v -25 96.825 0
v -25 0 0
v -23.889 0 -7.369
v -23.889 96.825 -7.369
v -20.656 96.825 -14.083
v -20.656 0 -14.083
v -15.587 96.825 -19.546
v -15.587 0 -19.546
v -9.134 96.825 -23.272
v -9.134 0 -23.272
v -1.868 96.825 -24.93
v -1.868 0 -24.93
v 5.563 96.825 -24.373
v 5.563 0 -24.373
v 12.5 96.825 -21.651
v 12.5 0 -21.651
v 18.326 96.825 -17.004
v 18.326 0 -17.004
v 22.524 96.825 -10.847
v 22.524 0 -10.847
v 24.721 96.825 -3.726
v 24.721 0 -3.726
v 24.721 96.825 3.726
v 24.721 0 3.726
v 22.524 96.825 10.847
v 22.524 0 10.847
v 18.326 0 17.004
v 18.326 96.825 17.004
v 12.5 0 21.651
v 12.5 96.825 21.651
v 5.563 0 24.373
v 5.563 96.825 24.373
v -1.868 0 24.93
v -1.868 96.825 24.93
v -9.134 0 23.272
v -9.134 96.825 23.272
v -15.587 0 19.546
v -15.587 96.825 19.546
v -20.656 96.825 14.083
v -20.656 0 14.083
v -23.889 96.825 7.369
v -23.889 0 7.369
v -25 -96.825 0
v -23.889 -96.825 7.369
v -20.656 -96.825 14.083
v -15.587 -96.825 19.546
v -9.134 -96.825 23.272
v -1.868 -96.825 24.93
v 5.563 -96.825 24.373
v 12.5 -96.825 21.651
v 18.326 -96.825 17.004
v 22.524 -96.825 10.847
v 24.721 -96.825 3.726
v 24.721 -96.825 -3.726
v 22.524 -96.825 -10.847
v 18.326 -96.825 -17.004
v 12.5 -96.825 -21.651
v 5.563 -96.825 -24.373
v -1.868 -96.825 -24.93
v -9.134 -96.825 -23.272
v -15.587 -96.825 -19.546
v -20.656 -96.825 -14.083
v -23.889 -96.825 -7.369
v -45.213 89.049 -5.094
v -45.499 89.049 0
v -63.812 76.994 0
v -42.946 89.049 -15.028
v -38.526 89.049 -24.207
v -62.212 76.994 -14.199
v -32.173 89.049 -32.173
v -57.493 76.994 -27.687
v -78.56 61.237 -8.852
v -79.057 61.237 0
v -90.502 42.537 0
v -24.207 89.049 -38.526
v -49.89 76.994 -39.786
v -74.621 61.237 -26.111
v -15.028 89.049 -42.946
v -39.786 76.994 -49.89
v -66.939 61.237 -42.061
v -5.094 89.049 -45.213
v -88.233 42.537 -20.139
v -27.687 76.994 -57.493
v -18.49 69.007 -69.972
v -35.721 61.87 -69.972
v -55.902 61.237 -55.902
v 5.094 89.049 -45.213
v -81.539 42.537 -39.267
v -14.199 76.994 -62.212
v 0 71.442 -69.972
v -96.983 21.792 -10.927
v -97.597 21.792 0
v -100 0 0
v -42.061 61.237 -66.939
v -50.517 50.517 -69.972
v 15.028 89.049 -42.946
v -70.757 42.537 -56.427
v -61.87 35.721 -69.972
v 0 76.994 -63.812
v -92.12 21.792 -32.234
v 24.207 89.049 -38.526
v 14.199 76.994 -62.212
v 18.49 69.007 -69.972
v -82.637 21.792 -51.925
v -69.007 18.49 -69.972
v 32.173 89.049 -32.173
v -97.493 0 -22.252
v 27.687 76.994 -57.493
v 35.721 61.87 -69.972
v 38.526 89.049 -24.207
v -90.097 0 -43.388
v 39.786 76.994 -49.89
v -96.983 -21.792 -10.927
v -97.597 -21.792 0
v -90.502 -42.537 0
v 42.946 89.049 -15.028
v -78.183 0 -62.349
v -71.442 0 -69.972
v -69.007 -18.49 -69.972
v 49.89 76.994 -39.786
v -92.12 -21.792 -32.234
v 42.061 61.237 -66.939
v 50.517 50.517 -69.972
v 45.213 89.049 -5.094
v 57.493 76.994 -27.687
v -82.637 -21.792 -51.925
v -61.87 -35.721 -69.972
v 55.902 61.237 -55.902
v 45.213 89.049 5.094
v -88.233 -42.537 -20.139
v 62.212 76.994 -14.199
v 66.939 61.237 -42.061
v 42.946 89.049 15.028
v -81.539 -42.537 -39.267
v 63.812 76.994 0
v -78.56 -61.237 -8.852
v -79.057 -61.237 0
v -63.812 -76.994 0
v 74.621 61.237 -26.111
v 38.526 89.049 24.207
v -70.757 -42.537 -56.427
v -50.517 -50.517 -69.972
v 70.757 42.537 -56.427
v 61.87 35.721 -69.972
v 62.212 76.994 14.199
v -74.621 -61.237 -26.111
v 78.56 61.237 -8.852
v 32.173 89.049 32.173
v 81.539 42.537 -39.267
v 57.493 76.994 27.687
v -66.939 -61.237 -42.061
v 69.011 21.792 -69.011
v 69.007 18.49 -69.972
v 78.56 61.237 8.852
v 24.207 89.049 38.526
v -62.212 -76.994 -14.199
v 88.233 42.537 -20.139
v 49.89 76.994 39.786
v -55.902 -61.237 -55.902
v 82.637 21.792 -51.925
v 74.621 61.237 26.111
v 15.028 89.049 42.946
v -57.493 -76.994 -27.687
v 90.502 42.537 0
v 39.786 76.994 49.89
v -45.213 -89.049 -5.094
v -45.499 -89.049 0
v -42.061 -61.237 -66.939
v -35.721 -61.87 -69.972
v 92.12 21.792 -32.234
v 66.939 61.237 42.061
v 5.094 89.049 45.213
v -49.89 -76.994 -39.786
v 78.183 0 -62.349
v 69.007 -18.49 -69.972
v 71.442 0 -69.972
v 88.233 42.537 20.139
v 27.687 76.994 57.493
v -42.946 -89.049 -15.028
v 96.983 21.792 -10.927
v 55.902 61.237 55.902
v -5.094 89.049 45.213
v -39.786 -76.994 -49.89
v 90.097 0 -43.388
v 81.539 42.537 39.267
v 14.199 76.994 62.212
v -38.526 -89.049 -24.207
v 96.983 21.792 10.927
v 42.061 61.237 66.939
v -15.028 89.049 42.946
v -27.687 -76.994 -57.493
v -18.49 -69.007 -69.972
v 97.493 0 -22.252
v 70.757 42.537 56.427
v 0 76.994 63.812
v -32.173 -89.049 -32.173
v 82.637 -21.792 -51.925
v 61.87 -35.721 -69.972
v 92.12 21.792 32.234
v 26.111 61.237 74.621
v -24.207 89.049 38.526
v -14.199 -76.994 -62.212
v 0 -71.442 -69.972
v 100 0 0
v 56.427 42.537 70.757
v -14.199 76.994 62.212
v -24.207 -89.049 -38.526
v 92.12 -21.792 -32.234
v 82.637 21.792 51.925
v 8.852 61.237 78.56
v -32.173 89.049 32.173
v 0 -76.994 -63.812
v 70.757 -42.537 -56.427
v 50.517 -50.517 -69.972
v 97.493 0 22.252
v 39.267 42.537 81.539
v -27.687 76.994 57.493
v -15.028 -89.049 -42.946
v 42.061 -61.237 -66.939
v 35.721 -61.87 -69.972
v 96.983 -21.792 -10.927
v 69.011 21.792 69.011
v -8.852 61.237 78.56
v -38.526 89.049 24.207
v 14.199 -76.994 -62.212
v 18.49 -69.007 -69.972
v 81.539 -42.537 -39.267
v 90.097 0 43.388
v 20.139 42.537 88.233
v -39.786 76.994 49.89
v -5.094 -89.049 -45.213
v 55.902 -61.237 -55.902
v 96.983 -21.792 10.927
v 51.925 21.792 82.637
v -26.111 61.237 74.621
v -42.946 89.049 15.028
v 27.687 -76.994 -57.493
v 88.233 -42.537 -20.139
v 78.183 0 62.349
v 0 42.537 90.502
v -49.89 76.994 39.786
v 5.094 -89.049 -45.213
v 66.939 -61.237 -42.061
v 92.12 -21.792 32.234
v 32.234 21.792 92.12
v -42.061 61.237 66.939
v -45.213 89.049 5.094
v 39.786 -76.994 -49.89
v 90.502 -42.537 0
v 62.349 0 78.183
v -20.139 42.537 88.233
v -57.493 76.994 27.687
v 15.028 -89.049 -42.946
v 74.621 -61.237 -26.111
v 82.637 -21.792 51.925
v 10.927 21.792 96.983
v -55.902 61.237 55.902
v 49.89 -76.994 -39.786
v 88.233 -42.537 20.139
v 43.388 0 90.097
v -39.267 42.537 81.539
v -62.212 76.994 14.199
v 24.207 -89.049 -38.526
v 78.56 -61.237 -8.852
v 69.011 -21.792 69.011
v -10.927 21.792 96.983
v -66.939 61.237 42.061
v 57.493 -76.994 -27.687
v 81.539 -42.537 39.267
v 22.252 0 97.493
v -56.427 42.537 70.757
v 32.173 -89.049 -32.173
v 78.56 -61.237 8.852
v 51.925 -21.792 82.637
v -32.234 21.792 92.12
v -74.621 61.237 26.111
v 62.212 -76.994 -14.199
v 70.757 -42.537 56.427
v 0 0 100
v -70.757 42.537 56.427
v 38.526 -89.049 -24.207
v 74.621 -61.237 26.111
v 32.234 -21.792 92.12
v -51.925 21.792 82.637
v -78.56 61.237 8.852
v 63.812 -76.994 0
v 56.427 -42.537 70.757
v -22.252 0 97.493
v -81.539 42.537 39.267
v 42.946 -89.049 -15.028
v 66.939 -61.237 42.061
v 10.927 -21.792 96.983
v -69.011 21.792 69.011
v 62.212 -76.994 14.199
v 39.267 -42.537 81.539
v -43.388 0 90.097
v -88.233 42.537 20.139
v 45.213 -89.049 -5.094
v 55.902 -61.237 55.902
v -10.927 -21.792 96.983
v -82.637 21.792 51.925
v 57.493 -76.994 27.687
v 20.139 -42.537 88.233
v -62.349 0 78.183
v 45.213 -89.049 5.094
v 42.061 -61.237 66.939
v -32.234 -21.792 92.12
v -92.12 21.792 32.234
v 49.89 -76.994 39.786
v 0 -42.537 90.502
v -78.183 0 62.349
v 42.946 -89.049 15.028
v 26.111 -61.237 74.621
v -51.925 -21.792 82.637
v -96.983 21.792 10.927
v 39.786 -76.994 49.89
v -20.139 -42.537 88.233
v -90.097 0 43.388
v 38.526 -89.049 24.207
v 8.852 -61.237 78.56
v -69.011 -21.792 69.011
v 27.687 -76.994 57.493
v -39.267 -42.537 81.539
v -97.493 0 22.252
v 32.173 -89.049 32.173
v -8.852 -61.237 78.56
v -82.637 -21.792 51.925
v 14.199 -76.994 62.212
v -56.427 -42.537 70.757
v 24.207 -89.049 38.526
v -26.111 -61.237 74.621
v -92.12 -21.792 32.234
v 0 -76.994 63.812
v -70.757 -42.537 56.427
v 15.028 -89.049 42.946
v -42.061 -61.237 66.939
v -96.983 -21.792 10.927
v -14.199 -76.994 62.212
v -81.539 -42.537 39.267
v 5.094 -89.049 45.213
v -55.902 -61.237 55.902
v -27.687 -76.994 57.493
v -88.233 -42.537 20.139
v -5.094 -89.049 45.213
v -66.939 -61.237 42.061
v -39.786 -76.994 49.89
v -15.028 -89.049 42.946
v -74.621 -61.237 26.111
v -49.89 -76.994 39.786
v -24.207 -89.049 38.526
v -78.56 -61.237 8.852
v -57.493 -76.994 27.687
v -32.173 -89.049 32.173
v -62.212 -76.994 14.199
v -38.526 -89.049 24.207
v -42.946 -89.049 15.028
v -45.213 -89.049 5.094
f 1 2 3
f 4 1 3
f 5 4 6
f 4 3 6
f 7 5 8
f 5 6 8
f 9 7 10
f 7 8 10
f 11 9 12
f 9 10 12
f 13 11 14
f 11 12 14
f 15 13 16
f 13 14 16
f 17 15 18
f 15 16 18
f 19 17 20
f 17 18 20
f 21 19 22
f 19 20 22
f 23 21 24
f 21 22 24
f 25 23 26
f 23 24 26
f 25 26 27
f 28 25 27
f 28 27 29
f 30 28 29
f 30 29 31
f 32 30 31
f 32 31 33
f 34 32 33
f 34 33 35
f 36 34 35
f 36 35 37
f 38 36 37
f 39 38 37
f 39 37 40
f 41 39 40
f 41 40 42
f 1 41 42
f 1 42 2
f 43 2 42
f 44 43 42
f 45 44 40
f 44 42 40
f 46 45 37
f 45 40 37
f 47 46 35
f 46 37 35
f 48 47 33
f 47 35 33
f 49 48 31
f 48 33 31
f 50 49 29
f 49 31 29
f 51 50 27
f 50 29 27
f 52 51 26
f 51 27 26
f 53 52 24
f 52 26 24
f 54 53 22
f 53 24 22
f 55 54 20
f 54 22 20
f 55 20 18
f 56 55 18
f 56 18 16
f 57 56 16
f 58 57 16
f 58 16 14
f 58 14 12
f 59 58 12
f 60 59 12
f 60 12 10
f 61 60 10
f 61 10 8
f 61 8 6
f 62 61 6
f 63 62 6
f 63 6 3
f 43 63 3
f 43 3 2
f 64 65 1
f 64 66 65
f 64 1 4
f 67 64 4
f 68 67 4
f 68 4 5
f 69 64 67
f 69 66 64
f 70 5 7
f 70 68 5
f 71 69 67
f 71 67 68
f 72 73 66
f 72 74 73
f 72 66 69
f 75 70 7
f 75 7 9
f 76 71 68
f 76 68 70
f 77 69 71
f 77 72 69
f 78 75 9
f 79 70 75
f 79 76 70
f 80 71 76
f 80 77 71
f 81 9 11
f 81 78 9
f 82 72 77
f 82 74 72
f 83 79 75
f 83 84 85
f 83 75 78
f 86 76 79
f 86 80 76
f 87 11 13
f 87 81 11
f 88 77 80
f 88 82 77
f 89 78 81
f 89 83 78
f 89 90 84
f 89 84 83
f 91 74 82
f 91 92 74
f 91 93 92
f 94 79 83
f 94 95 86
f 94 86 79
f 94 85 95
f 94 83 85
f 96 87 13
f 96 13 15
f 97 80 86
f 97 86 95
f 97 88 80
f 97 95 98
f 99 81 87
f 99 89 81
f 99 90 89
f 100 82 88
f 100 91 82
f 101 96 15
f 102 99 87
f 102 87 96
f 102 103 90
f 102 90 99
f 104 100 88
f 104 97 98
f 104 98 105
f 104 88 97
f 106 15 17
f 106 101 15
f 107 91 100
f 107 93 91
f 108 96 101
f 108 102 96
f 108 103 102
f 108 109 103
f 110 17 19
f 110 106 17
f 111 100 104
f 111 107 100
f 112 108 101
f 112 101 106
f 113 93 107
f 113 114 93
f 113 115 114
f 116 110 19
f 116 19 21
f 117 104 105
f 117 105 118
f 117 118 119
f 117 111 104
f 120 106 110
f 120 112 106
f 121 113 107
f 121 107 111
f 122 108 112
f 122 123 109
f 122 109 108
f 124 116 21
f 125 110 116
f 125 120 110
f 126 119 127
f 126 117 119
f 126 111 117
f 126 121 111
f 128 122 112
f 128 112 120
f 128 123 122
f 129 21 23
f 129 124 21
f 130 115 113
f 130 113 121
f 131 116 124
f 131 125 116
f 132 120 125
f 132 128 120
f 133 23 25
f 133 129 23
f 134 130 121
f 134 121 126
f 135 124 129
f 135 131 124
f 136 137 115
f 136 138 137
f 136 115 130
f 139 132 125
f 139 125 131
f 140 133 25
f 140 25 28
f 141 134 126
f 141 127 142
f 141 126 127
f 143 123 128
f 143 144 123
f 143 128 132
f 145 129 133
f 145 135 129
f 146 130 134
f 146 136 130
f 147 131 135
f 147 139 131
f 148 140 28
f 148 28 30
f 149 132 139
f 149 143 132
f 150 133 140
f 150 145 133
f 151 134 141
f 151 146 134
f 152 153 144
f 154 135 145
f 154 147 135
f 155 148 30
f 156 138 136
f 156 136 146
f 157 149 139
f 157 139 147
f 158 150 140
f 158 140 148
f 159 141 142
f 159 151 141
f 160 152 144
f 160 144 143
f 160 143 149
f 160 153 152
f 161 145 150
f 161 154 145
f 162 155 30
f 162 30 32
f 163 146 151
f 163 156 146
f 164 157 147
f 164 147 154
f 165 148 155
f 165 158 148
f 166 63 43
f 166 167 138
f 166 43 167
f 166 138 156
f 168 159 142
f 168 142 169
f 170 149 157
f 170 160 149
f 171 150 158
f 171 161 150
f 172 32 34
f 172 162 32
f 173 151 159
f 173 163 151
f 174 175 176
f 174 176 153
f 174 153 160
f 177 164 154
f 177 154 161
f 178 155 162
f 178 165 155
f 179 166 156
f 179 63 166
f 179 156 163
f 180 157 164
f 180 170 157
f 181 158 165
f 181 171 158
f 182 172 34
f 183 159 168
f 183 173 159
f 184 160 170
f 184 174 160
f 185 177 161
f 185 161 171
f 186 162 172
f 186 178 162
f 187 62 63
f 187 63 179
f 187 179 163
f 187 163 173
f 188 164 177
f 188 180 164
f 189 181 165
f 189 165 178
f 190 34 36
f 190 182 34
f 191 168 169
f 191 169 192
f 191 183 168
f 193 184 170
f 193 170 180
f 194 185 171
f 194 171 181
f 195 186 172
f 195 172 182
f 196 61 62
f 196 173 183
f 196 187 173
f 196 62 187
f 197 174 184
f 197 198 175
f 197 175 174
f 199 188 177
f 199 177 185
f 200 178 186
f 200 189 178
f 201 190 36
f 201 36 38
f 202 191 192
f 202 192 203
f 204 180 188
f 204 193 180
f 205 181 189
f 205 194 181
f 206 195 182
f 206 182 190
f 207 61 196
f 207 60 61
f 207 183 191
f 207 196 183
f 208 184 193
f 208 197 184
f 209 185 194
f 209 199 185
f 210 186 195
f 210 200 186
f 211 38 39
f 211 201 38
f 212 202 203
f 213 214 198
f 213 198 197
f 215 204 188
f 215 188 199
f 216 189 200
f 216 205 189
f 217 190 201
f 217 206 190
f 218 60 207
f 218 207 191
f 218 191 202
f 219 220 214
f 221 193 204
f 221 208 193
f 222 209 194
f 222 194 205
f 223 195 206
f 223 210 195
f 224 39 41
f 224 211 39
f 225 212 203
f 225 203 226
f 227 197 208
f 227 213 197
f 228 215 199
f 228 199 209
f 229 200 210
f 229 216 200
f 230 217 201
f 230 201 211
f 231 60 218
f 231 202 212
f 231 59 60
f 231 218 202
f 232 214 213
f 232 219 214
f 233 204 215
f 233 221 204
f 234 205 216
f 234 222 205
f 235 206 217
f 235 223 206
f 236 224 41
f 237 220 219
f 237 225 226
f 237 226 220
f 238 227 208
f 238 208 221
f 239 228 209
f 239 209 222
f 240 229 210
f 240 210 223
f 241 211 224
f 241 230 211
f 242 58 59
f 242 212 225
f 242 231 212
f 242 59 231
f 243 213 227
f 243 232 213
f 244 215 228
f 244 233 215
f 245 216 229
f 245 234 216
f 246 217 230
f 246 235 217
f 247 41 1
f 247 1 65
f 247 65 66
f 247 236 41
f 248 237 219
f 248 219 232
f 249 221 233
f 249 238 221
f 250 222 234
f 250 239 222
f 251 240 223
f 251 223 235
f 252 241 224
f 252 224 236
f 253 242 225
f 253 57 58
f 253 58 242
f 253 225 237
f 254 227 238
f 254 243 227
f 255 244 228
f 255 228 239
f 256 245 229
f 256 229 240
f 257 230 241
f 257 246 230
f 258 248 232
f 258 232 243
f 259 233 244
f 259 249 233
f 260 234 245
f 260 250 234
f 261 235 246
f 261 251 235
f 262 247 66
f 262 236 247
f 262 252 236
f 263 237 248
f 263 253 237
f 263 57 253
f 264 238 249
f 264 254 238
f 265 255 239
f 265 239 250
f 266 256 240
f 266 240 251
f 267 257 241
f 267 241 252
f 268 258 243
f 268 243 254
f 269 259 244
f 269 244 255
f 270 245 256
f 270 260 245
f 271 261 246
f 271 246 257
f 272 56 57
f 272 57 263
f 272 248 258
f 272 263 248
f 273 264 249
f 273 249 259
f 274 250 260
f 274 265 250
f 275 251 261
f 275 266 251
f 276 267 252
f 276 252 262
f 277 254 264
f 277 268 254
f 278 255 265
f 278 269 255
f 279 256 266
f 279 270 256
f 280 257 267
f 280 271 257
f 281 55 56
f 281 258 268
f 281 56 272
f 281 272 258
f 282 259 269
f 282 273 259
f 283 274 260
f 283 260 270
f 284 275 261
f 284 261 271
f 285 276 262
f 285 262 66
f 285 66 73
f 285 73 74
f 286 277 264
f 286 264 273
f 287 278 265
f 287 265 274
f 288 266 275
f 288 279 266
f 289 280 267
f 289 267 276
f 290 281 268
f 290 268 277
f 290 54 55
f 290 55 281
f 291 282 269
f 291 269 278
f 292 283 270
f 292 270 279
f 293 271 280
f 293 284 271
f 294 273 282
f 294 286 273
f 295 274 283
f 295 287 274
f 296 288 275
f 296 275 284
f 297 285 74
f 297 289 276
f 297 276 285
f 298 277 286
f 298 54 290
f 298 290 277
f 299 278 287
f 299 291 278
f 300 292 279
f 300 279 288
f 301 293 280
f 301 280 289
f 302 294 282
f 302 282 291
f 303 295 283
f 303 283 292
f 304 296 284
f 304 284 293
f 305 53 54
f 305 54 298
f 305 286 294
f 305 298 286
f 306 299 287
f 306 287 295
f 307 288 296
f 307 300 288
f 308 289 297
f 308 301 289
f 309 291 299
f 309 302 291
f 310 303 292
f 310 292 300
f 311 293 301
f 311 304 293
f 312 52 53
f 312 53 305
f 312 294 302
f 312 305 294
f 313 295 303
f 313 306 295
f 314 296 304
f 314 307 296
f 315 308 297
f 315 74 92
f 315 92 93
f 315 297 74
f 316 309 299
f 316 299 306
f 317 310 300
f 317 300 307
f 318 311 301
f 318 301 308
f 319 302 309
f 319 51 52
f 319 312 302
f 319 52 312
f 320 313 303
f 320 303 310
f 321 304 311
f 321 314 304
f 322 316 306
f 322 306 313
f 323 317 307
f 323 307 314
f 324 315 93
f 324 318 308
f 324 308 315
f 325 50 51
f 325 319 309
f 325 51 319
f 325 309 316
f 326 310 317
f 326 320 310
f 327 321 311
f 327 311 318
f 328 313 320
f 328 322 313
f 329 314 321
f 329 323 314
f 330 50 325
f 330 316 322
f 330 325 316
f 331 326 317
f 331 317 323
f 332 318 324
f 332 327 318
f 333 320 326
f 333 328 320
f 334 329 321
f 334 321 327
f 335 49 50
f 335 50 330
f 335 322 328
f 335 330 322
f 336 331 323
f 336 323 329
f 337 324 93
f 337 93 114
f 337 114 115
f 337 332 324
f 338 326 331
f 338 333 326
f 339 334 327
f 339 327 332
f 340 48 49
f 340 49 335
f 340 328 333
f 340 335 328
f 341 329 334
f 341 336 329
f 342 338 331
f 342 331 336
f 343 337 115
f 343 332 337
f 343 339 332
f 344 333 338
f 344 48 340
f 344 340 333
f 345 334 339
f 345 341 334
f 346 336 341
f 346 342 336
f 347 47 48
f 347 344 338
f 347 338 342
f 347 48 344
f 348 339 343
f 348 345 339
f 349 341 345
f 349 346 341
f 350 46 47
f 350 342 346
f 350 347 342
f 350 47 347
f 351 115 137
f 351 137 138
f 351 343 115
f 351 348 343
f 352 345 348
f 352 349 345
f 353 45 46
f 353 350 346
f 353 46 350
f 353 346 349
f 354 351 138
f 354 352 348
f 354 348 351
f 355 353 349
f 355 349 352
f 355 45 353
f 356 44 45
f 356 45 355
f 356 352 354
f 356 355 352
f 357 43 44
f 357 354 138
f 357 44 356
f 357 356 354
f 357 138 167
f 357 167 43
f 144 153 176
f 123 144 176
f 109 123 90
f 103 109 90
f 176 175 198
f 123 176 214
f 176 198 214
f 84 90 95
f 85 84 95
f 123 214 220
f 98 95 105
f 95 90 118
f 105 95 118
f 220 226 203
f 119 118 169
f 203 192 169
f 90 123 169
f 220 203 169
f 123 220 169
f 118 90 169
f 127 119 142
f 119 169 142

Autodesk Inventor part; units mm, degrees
ref_plane "YZ Plane" through (0, 0, 0) normal (1, 0, 0) x (0, 1, 0)
ref_plane "XY Plane" through (0, 0, 0) normal (0, 0, 1) x (1, 0, 0)
sketch "スケッチ1" plane through (0, 0, 0) normal (0, 0, 1) x (1, 0, 0)
  arc A0 (0, 100) -> (0, -100) centre (0, 0) ccw
  line L0 (0, 100) -> (0, -100)
  dimension "d0" = 200
revolve "回転1" add sketch "スケッチ1" angle 360 about axis through (0, 100, 0) along (0, -1, 0)
sketch "スケッチ2" plane through (0, 0, 0) normal (0, 1, 0) x (-1, 0, 0)
  line L0 (140.6562, -148.6683) -> (-138.1636, -148.6683)
  line L1 (-138.1636, -148.6683) -> (-138.1636, -69.972)
  line L2 (-138.1636, -69.972) -> (140.6562, -69.972)
  line L3 (140.6562, -69.972) -> (140.6562, -148.6683)
  point P0 (0, 0)
extrude "押し出し1" cut sketch "スケッチ2" along normal mid plane 200
sketch "スケッチ3" plane through (0, 0, 0) normal (0, 1, 0) x (-1, 0, 0)
  circle A0 centre (0, 0) radius 25
  dimension "d4" = 50
extrude "押し出し2" cut sketch "スケッチ3" along normal mid plane 200
properties part number "HeadP"
